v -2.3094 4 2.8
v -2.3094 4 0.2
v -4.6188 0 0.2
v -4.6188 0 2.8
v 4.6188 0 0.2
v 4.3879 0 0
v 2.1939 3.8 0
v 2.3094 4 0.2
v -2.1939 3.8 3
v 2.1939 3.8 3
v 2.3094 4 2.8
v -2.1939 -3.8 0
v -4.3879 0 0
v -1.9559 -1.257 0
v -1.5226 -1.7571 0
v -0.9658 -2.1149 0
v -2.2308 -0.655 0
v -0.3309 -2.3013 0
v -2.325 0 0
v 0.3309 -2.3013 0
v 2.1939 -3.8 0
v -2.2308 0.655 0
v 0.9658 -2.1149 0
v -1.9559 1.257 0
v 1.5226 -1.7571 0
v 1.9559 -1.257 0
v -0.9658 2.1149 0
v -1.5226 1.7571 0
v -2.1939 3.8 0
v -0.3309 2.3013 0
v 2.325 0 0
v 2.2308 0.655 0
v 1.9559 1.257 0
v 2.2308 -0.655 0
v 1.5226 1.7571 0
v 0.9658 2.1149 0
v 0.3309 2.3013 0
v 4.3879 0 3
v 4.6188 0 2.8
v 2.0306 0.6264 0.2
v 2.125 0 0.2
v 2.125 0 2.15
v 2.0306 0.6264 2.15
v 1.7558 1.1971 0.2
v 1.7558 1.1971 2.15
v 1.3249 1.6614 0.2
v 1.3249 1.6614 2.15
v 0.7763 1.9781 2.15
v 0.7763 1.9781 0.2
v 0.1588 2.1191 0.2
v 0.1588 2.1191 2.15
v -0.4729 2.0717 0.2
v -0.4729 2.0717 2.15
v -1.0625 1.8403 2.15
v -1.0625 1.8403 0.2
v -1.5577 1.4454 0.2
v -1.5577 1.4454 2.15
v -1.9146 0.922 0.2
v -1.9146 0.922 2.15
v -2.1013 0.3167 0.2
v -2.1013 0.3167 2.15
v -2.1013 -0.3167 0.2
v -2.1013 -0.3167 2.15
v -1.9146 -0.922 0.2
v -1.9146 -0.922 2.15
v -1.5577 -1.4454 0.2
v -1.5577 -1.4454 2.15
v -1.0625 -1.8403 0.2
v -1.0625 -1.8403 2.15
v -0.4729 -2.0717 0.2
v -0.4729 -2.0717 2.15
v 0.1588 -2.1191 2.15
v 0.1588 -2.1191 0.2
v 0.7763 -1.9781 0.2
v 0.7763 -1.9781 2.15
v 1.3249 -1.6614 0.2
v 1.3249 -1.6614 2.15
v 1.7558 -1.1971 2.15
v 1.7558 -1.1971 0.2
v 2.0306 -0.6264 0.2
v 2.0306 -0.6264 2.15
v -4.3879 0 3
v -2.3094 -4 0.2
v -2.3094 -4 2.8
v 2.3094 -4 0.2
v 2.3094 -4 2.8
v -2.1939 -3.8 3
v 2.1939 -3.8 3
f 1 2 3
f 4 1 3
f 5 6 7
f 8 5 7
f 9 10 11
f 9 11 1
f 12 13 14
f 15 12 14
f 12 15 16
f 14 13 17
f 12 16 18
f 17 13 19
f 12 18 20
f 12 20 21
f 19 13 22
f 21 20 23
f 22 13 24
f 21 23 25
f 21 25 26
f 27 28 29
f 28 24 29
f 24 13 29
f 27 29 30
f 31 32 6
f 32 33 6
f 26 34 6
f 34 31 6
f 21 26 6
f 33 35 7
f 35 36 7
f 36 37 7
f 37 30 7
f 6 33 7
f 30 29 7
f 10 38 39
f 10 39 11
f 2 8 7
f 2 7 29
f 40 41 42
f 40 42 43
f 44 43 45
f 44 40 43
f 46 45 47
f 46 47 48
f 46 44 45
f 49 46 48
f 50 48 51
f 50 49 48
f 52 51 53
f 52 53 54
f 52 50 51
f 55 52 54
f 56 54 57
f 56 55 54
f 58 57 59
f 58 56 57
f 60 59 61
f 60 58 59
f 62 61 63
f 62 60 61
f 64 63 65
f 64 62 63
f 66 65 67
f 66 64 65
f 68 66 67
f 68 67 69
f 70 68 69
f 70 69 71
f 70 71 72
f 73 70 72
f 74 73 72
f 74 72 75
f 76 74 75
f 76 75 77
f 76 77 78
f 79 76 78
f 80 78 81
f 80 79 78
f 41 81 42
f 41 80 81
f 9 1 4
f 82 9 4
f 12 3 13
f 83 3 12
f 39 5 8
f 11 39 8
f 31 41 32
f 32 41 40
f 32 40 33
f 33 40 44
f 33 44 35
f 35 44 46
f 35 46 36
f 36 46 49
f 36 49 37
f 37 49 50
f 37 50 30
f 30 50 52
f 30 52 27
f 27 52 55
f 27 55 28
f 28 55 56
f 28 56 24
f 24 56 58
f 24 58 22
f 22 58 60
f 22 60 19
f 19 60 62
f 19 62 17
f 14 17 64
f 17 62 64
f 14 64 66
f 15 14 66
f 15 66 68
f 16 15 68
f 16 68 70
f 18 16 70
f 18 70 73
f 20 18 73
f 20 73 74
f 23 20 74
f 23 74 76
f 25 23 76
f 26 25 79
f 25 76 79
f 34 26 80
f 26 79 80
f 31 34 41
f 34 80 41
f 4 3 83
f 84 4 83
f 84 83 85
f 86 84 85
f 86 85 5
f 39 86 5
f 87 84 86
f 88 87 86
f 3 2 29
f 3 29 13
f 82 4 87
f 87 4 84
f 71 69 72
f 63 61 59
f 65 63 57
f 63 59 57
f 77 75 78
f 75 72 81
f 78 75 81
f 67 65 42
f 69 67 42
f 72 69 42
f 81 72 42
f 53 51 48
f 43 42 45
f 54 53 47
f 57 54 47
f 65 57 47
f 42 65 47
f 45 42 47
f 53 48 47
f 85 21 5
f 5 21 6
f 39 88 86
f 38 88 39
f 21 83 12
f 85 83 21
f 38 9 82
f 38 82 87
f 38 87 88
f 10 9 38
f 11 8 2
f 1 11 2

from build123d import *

# Parameters (mm, degrees)
PAD_DEPTH       = 3
SKETCH001_R     = 2.125
POCKET_DEPTH    = 2.15
CHAMFER_SIZE    = 0.2
CHAMFER001_SIZE = 0.2


with BuildPart() as part:
    # Sketch → Pad (new body)
    with BuildSketch(Plane.XY):
        Polygon((4.618802, 0), (2.309401, 4), (-2.309401, 4), (-4.618802, 0), (-2.309401, -4), (2.309401, -4), align=None)
    extrude(amount=PAD_DEPTH)

    # Sketch001 → Pocket (cut)
    with BuildSketch(Plane.XY):
        Circle(SKETCH001_R)
    extrude(amount=POCKET_DEPTH, mode=Mode.SUBTRACT)

    # Chamfer
    chamfer_edges = [part.edges().sort_by_distance(p)[0] for p in [
        (3.464102, 2, 3),
        (0, 4, 3),
        (-3.464102, 2, 3),
        (-3.464102, -2, 3),
        (0, -4, 3),
        (3.464102, -2, 3),
    ]]
    chamfer(chamfer_edges, length=CHAMFER_SIZE)

    # Chamfer001
    chamfer001_edges = [part.edges().sort_by_distance(p)[0] for p in [
        (3.464102, 2, 0),
        (3.464102, -2, 0),
        (0, 4, 0),
        (0, -4, 0),
        (-3.464102, 2, 0),
        (-3.464102, -2, 0),
        (-2.125, 0, 0),
    ]]
    chamfer(chamfer001_edges, length=CHAMFER001_SIZE)


solid = part.part
